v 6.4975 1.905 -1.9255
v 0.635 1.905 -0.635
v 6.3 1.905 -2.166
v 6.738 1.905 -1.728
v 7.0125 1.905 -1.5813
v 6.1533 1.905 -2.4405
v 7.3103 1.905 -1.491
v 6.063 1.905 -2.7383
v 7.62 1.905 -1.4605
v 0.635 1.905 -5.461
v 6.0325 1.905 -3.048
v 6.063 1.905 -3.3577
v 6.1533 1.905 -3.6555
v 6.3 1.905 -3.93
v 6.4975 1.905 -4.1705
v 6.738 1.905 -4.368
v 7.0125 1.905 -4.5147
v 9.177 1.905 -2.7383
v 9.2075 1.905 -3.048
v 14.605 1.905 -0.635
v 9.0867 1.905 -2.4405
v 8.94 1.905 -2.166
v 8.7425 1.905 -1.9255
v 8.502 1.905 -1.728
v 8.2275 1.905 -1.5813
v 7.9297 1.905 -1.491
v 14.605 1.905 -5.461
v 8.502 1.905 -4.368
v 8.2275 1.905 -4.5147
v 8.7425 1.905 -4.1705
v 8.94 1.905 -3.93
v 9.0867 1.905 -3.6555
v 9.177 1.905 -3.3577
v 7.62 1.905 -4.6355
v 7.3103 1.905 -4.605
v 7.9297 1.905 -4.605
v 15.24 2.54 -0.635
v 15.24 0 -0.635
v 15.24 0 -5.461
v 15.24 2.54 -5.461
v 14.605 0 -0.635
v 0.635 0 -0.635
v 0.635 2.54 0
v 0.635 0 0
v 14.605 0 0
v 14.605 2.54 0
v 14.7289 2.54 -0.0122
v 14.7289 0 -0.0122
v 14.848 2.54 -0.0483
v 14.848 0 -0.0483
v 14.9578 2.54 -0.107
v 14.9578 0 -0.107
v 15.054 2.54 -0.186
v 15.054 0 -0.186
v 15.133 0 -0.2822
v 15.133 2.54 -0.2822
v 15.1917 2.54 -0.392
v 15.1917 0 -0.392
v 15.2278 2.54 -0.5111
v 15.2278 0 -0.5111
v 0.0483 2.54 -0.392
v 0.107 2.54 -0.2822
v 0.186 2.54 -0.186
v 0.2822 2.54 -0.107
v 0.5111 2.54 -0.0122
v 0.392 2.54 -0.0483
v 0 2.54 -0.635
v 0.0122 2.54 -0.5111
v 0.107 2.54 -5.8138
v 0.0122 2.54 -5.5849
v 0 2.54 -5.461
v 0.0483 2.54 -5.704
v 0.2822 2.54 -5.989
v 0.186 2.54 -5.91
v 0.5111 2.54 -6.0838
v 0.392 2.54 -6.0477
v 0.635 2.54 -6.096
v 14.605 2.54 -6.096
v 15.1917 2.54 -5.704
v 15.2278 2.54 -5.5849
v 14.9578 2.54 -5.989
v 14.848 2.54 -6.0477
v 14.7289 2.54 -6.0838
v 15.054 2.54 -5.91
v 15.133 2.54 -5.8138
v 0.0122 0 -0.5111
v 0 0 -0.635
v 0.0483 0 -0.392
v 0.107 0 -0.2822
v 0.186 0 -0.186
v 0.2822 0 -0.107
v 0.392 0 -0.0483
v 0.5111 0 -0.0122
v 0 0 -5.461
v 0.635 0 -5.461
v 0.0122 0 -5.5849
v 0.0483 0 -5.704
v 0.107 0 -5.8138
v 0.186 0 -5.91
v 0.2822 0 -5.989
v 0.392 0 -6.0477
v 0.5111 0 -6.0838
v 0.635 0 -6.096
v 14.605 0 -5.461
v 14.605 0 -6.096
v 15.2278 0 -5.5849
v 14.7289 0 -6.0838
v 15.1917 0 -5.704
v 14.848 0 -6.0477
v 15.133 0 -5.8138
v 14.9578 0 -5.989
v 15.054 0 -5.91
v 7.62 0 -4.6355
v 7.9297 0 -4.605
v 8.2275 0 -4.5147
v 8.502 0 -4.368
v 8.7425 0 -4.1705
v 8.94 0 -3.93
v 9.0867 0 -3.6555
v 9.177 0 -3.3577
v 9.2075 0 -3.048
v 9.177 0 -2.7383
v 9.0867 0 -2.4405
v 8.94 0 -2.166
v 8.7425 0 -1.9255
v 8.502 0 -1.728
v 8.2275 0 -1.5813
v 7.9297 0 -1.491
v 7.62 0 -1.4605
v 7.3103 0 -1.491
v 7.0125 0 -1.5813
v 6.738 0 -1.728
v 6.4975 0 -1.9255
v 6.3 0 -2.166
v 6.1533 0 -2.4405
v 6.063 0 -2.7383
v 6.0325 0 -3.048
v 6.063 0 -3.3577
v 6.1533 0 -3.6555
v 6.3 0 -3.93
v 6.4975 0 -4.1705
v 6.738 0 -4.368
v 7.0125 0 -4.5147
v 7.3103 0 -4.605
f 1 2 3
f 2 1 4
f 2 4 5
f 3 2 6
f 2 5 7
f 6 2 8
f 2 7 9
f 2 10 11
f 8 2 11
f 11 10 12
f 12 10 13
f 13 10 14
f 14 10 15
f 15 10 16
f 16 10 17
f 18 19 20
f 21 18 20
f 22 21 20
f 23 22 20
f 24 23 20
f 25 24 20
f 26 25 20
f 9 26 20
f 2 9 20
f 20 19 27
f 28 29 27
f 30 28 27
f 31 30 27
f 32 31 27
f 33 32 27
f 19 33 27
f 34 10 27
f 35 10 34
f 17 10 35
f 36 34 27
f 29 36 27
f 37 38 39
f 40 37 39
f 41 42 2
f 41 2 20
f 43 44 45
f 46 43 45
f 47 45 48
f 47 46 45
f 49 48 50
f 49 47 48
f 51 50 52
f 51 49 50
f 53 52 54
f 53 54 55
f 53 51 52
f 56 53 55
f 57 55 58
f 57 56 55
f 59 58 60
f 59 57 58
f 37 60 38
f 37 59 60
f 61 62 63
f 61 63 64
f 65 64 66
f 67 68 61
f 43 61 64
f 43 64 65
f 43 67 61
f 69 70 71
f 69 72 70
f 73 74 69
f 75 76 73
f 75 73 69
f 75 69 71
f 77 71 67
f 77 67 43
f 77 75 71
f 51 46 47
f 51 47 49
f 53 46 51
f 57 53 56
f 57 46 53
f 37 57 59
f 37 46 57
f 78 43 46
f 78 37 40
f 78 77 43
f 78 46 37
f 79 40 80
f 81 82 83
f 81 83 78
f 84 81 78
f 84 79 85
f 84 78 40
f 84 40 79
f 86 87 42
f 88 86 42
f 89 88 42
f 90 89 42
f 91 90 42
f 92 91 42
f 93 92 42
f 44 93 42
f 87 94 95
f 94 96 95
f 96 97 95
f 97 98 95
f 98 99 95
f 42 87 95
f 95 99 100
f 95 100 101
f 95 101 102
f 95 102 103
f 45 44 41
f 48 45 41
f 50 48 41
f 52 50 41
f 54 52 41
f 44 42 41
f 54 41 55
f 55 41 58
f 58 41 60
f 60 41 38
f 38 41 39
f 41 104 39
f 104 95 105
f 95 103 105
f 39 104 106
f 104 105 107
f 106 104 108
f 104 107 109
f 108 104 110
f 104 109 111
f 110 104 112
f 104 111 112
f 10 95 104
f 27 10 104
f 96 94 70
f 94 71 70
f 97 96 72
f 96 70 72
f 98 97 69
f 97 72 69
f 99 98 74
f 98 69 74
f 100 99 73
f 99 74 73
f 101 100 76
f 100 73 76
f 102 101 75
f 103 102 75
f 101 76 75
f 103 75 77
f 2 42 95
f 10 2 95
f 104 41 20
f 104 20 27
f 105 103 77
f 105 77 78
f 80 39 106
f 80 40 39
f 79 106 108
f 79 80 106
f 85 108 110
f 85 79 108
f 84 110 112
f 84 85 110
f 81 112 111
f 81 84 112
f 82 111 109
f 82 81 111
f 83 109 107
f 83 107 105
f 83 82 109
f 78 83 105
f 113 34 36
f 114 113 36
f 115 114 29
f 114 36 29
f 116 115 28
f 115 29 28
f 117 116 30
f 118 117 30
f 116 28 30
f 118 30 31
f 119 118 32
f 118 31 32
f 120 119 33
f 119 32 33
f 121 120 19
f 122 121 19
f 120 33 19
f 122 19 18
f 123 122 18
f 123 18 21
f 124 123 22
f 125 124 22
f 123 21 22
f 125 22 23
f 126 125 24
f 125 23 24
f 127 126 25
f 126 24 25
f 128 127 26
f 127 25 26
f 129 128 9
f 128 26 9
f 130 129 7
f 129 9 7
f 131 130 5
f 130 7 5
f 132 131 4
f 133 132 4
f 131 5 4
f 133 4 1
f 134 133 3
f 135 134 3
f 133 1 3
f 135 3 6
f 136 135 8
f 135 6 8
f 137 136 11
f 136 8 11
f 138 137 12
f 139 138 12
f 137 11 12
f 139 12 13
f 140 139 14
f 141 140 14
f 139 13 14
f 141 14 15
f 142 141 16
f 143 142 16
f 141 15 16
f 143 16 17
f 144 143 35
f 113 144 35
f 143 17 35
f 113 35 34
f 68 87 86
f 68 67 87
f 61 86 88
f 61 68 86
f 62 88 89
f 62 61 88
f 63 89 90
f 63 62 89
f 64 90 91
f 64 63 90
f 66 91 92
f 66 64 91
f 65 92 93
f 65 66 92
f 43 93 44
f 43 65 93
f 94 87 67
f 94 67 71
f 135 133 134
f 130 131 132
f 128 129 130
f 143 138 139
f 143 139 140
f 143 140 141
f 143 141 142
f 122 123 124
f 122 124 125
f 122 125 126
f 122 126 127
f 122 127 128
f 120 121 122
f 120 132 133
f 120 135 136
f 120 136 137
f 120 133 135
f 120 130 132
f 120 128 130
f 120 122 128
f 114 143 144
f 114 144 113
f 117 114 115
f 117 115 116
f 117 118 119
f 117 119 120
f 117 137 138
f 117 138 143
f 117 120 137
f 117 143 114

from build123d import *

# Parameters (mm, degrees)
SKETCH1_W           = 15.24
SKETCH1_H           = 6.096
BOSS_EXTRUDE1_DEPTH = 2.54
SHELL1_T            = -0.635
FILLET1_R           = 0.635
SKETCH2_R           = 1.5875
BOSS_EXTRUDE2_DEPTH = 1.905


with BuildPart() as part:
    # Sketch1 → Boss-Extrude1 (new body)
    with BuildSketch(Plane(origin=(0, 0, 0), x_dir=(1, 0, 0), z_dir=(0, 1, 0))):
        with Locations((7.62, 3.048)):
            Rectangle(SKETCH1_W, SKETCH1_H)
    extrude(amount=BOSS_EXTRUDE1_DEPTH)

    # Shell1
    shell1_openings = [part.faces().sort_by_distance(p)[0] for p in [
        (7.62, 0, -3.048),
    ]]
    offset(amount=SHELL1_T, openings=shell1_openings, kind=Kind.INTERSECTION)

    # Fillet1
    fillet1_edges = [part.edges().sort_by_distance(p)[0] for p in [
        (0, 1.27, 0),
        (15.24, 1.27, 0),
        (15.24, 1.27, -6.096),
        (0, 1.27, -6.096),
    ]]
    fillet(fillet1_edges, radius=FILLET1_R)

    # Sketch2 → Boss-Extrude2 (add)
    with BuildSketch(Plane.XZ.offset(-1.905)):
        with Locations(Location((7.62, -3.048, 0), (0, 0, 270))):
            Circle(SKETCH2_R)
    extrude(amount=BOSS_EXTRUDE2_DEPTH)


solid = part.part
